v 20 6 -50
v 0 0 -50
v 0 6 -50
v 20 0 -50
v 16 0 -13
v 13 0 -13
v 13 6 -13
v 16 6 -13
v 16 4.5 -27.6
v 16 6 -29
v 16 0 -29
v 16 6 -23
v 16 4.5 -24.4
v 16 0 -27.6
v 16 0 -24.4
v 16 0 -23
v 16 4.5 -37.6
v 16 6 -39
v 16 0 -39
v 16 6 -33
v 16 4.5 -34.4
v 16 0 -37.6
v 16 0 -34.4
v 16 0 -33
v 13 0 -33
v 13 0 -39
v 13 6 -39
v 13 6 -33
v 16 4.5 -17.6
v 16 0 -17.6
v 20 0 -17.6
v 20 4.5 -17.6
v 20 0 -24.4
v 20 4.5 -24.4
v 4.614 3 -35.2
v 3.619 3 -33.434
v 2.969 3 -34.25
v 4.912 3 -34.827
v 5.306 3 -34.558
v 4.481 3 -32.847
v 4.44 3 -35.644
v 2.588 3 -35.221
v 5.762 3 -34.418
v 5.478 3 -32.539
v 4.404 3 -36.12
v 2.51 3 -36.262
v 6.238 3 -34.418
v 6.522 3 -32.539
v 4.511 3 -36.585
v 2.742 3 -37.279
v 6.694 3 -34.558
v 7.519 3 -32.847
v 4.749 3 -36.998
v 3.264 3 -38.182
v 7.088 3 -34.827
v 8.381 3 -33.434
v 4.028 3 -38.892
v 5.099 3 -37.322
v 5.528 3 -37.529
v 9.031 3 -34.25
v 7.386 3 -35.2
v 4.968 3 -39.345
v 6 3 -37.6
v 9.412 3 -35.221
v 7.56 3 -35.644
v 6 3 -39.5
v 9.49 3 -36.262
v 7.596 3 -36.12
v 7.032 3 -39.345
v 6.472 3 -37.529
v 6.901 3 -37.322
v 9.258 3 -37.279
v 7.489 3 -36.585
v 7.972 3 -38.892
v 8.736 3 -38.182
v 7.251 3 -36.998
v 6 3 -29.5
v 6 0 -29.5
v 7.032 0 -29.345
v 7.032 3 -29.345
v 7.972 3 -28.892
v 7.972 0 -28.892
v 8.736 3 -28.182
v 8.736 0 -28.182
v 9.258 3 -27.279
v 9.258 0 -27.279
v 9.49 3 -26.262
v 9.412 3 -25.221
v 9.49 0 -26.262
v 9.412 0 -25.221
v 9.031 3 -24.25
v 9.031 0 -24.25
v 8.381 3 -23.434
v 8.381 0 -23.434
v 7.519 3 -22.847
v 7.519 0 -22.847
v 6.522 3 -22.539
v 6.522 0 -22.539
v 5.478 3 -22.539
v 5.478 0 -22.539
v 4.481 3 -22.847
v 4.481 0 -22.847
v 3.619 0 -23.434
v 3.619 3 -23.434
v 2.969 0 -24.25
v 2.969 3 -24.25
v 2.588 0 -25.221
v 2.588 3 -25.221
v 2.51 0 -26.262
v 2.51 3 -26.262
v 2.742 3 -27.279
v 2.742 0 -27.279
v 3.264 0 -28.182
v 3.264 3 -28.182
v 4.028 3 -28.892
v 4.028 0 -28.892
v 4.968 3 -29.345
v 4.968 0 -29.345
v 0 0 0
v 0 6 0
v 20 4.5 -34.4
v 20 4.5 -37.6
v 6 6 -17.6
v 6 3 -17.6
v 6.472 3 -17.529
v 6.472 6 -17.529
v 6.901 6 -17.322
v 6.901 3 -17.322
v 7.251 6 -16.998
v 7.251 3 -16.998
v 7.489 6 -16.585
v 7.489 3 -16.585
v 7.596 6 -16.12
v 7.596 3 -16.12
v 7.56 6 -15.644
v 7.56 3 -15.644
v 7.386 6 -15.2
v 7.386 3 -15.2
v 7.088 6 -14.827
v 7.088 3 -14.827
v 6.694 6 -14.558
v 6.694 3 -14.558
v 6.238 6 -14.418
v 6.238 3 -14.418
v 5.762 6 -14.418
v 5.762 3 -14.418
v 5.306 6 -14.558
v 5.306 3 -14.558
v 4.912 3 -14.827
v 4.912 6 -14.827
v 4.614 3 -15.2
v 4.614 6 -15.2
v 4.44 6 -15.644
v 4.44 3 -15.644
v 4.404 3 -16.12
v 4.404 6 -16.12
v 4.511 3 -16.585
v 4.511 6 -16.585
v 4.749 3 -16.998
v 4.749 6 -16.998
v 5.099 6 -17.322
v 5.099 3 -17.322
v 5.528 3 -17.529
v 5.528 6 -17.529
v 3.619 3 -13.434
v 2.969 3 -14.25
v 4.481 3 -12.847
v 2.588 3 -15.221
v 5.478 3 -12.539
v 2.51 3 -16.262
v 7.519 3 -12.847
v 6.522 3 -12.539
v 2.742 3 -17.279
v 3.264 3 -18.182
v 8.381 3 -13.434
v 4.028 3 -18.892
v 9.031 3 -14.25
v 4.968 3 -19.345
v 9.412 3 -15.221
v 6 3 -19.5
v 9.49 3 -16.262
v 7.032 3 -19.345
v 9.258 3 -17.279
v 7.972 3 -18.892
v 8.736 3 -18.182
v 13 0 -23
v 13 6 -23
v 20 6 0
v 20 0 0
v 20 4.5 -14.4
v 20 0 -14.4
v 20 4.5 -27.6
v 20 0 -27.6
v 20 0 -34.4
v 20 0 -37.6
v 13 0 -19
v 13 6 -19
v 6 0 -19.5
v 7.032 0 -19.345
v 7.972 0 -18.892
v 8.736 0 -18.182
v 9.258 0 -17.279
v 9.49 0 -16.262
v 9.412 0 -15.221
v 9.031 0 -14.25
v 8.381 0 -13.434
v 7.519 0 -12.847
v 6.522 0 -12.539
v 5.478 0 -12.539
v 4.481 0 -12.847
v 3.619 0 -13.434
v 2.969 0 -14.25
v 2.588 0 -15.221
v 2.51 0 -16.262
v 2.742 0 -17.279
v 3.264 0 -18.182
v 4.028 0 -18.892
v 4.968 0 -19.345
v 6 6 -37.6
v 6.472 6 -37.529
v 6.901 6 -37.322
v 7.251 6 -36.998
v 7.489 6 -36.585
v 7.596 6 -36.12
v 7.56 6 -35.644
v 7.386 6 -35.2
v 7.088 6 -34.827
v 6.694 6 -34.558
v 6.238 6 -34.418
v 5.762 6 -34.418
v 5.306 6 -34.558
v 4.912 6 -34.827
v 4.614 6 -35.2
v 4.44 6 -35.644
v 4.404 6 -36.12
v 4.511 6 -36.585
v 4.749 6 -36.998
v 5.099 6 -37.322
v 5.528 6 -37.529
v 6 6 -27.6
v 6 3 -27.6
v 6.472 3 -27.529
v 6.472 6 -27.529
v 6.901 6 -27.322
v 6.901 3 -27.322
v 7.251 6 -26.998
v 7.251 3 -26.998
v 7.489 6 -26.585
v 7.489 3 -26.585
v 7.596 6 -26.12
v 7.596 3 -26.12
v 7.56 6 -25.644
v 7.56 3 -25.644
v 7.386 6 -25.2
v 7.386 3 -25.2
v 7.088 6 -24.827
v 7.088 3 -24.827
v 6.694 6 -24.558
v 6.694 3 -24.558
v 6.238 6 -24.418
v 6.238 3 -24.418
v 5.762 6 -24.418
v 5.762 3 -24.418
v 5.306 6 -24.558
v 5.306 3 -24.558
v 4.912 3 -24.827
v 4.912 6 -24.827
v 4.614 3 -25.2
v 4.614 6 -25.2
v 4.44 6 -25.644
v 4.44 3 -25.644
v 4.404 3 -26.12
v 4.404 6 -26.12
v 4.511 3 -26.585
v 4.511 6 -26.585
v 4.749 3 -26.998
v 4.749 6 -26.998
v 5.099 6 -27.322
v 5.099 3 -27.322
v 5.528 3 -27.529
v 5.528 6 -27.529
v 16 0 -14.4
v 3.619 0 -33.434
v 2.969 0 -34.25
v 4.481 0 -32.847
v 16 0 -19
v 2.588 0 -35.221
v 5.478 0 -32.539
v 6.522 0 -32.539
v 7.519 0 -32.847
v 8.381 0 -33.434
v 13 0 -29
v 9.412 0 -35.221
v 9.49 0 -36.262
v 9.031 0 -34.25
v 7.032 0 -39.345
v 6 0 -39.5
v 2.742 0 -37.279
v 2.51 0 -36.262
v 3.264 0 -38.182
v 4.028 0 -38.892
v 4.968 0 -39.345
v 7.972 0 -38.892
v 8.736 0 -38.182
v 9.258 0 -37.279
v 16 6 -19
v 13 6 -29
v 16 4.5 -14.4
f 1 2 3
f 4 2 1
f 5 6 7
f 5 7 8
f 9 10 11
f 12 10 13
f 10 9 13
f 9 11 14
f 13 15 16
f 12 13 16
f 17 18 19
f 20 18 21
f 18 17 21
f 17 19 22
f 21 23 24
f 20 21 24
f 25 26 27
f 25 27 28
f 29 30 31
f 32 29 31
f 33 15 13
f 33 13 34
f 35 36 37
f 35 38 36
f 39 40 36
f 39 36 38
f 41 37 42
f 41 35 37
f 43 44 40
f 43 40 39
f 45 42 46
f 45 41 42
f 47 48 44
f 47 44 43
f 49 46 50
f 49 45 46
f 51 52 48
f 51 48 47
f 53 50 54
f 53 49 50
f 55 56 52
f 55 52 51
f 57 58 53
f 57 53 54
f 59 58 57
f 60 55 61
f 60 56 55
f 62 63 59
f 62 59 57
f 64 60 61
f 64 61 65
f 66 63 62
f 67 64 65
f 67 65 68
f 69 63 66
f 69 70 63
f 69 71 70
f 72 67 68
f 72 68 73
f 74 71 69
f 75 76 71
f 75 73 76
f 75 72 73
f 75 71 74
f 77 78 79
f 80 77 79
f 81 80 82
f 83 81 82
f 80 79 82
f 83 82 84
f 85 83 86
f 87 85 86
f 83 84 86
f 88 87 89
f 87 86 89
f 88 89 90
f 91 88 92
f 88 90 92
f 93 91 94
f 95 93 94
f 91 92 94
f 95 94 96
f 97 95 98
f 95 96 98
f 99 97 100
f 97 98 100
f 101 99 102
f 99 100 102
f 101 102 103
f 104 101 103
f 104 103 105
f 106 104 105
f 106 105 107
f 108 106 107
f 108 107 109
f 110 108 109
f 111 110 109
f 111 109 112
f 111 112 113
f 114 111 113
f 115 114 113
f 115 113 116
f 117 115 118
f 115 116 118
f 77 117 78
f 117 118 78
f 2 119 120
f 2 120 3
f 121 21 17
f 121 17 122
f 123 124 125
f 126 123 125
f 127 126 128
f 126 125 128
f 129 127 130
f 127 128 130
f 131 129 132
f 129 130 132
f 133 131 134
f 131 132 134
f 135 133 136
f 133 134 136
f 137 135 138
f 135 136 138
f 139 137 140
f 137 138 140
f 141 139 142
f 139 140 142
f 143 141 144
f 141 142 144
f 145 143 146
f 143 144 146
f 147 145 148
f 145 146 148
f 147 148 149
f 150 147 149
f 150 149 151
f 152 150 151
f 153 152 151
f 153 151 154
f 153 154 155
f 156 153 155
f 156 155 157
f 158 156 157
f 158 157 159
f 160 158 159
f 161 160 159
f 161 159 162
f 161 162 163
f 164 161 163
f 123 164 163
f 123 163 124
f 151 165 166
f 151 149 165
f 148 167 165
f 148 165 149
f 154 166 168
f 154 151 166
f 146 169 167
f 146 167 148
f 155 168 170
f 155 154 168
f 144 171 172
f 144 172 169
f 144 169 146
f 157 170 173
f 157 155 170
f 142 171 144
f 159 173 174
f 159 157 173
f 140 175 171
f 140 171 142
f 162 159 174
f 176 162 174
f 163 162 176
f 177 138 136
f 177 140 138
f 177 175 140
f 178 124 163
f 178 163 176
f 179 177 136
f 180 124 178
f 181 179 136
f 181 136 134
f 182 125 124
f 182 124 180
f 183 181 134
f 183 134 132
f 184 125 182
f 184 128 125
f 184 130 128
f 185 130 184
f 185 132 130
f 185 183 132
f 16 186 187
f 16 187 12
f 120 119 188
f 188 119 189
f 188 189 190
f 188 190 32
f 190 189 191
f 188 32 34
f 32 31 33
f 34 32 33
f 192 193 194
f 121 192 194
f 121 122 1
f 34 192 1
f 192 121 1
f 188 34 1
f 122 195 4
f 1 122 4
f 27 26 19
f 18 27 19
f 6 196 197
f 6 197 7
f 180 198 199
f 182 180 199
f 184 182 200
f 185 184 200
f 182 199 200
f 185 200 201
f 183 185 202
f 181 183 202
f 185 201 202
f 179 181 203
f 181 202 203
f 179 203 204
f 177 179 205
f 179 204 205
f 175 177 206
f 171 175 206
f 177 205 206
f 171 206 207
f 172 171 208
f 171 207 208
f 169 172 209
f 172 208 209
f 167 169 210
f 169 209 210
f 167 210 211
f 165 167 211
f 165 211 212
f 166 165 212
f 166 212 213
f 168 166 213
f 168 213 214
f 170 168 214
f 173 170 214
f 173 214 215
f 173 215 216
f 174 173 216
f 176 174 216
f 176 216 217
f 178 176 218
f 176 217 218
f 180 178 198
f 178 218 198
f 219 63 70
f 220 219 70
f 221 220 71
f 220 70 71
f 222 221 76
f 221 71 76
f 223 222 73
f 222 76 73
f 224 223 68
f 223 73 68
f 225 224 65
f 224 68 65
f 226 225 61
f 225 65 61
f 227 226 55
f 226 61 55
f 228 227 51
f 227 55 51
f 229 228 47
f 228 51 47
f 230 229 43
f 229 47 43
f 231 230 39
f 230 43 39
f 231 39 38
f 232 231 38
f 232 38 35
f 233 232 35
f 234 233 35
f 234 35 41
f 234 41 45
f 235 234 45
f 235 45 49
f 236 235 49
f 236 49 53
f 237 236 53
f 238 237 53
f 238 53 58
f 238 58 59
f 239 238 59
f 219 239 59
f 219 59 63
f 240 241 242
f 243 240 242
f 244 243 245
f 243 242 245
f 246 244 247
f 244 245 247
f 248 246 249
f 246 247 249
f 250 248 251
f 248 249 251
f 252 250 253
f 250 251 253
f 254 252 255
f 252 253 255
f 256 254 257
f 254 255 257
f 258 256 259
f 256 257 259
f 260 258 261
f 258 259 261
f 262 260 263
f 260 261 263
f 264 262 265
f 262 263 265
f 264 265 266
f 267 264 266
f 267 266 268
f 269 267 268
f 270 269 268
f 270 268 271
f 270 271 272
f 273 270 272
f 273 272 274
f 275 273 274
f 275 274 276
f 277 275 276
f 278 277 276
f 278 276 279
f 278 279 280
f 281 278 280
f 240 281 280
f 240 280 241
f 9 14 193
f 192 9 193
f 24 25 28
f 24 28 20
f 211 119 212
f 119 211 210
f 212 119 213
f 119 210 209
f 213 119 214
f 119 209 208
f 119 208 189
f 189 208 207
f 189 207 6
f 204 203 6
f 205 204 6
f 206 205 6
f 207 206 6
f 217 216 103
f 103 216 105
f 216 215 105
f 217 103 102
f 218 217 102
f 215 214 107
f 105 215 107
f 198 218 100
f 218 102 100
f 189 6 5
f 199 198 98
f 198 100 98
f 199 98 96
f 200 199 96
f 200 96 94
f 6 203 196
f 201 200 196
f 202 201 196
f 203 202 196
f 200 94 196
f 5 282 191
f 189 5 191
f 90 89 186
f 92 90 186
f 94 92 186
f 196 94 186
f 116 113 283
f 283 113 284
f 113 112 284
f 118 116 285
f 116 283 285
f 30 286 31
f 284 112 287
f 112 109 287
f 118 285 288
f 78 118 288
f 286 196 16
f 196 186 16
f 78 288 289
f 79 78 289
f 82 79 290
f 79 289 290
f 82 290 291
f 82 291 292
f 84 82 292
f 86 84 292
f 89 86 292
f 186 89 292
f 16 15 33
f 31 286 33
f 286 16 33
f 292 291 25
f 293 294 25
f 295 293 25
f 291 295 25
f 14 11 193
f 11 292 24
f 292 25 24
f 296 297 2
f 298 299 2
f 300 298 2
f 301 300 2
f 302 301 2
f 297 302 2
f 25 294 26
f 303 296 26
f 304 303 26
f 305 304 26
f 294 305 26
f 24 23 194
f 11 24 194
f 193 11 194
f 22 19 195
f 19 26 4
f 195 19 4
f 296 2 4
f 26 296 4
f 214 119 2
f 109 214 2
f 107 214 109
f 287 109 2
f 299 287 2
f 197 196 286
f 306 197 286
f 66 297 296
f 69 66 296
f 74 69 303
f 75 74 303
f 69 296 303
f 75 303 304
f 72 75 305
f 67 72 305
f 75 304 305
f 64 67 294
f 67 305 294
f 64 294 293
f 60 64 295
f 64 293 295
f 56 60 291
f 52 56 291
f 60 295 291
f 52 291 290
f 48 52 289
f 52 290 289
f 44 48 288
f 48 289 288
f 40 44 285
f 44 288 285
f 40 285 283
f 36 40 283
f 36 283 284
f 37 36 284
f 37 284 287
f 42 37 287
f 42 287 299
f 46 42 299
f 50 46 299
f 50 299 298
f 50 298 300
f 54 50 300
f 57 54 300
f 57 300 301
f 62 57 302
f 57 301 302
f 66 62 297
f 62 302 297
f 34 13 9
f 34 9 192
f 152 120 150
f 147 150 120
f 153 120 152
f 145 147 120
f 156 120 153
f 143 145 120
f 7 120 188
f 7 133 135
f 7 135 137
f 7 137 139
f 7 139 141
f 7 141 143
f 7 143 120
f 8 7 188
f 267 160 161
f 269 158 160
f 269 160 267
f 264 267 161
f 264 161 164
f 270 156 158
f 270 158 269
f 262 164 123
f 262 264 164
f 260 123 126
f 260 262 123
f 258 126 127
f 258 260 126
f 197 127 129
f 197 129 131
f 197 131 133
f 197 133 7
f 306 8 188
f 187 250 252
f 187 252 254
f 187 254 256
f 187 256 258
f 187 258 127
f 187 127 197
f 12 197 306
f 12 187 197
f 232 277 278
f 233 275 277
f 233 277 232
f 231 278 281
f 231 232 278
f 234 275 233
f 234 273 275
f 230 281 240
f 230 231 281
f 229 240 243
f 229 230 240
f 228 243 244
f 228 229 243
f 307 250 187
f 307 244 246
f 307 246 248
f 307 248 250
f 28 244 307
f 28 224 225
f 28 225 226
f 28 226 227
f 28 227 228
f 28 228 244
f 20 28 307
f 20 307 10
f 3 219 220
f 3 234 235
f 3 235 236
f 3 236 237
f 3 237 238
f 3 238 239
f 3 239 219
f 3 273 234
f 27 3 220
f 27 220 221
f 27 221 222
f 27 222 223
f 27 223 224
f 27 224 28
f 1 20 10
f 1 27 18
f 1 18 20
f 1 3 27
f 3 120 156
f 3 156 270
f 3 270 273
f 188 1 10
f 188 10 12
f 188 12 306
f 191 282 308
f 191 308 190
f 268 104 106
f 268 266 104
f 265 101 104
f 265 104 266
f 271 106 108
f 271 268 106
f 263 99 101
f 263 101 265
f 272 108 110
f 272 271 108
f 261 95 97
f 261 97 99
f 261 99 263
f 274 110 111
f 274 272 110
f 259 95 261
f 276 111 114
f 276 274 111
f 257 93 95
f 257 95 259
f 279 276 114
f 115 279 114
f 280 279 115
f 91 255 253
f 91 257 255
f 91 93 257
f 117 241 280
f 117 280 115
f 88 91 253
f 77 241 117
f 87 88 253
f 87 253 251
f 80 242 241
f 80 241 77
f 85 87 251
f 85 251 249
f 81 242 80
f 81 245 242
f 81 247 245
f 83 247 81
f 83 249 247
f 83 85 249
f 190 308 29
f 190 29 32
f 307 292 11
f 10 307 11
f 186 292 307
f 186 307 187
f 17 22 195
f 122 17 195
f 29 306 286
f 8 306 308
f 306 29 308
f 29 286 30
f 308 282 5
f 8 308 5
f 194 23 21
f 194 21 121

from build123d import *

# Parameters (mm, degrees)
SKETCH_1_W          = 20
SKETCH_1_H          = 50
EXTRUDE_1_DEPTH     = 6
SKETCH_3_W          = 4
SKETCH_3_H          = 3.2
CUT_EXTRUDE_1_DEPTH = 4.5
SKETCH_5_R          = 1.6
SKETCH_5_W          = 3
SKETCH_5_H          = 6
CUT_EXTRUDE_2_DEPTH = 14.5
SKETCH_7_R          = 3.5
CUT_EXTRUDE_3_DEPTH = 3


with BuildPart() as part:
    # 草图1 → 凸台-拉伸1 (new body)
    with BuildSketch(Plane(origin=(0, 0, 0), x_dir=(1, 0, 0), z_dir=(0, 1, 0))):
        with Locations((10, 25)):
            Rectangle(SKETCH_1_W, SKETCH_1_H)
    extrude(amount=EXTRUDE_1_DEPTH)

    # 草图3 → 切除-拉伸1 (cut)
    with BuildSketch(Plane.XZ):
        with Locations((18, -26)):
            Rectangle(SKETCH_3_W, SKETCH_3_H)
        with Locations((18, -16)):
            Rectangle(SKETCH_3_W, SKETCH_3_H)
        with Locations((18, -36)):
            Rectangle(SKETCH_3_W, SKETCH_3_H)
    extrude(amount=-CUT_EXTRUDE_1_DEPTH, mode=Mode.SUBTRACT)

    # 草图5 → 切除-拉伸2 (cut)
    with BuildSketch(Plane.XZ):
        with Locations(Location((6, -16, 0), (0, 0, 270))):
            Circle(SKETCH_5_R)
        with Locations(Location((6, -26, 0), (0, 0, 270))):
            Circle(SKETCH_5_R)
        with Locations(Location((6, -36, 0), (0, 0, 270))):
            Circle(SKETCH_5_R)
        with Locations((14.5, -36)):
            Rectangle(SKETCH_5_W, SKETCH_5_H)
        with Locations((14.5, -26)):
            Rectangle(SKETCH_5_W, SKETCH_5_H)
        with Locations((14.5, -16)):
            Rectangle(SKETCH_5_W, SKETCH_5_H)
    extrude(amount=-CUT_EXTRUDE_2_DEPTH, mode=Mode.SUBTRACT)

    # 草图7 → 切除-拉伸3 (cut)
    with BuildSketch(Plane.XZ):
        with Locations(Location((6, -16, 0), (0, 0, 270))):
            Circle(SKETCH_7_R)
        with Locations(Location((6, -26, 0), (0, 0, 270))):
            Circle(SKETCH_7_R)
        with Locations(Location((6, -36, 0), (0, 0, 270))):
            Circle(SKETCH_7_R)
    extrude(amount=-CUT_EXTRUDE_3_DEPTH, mode=Mode.SUBTRACT)


solid = part.part
